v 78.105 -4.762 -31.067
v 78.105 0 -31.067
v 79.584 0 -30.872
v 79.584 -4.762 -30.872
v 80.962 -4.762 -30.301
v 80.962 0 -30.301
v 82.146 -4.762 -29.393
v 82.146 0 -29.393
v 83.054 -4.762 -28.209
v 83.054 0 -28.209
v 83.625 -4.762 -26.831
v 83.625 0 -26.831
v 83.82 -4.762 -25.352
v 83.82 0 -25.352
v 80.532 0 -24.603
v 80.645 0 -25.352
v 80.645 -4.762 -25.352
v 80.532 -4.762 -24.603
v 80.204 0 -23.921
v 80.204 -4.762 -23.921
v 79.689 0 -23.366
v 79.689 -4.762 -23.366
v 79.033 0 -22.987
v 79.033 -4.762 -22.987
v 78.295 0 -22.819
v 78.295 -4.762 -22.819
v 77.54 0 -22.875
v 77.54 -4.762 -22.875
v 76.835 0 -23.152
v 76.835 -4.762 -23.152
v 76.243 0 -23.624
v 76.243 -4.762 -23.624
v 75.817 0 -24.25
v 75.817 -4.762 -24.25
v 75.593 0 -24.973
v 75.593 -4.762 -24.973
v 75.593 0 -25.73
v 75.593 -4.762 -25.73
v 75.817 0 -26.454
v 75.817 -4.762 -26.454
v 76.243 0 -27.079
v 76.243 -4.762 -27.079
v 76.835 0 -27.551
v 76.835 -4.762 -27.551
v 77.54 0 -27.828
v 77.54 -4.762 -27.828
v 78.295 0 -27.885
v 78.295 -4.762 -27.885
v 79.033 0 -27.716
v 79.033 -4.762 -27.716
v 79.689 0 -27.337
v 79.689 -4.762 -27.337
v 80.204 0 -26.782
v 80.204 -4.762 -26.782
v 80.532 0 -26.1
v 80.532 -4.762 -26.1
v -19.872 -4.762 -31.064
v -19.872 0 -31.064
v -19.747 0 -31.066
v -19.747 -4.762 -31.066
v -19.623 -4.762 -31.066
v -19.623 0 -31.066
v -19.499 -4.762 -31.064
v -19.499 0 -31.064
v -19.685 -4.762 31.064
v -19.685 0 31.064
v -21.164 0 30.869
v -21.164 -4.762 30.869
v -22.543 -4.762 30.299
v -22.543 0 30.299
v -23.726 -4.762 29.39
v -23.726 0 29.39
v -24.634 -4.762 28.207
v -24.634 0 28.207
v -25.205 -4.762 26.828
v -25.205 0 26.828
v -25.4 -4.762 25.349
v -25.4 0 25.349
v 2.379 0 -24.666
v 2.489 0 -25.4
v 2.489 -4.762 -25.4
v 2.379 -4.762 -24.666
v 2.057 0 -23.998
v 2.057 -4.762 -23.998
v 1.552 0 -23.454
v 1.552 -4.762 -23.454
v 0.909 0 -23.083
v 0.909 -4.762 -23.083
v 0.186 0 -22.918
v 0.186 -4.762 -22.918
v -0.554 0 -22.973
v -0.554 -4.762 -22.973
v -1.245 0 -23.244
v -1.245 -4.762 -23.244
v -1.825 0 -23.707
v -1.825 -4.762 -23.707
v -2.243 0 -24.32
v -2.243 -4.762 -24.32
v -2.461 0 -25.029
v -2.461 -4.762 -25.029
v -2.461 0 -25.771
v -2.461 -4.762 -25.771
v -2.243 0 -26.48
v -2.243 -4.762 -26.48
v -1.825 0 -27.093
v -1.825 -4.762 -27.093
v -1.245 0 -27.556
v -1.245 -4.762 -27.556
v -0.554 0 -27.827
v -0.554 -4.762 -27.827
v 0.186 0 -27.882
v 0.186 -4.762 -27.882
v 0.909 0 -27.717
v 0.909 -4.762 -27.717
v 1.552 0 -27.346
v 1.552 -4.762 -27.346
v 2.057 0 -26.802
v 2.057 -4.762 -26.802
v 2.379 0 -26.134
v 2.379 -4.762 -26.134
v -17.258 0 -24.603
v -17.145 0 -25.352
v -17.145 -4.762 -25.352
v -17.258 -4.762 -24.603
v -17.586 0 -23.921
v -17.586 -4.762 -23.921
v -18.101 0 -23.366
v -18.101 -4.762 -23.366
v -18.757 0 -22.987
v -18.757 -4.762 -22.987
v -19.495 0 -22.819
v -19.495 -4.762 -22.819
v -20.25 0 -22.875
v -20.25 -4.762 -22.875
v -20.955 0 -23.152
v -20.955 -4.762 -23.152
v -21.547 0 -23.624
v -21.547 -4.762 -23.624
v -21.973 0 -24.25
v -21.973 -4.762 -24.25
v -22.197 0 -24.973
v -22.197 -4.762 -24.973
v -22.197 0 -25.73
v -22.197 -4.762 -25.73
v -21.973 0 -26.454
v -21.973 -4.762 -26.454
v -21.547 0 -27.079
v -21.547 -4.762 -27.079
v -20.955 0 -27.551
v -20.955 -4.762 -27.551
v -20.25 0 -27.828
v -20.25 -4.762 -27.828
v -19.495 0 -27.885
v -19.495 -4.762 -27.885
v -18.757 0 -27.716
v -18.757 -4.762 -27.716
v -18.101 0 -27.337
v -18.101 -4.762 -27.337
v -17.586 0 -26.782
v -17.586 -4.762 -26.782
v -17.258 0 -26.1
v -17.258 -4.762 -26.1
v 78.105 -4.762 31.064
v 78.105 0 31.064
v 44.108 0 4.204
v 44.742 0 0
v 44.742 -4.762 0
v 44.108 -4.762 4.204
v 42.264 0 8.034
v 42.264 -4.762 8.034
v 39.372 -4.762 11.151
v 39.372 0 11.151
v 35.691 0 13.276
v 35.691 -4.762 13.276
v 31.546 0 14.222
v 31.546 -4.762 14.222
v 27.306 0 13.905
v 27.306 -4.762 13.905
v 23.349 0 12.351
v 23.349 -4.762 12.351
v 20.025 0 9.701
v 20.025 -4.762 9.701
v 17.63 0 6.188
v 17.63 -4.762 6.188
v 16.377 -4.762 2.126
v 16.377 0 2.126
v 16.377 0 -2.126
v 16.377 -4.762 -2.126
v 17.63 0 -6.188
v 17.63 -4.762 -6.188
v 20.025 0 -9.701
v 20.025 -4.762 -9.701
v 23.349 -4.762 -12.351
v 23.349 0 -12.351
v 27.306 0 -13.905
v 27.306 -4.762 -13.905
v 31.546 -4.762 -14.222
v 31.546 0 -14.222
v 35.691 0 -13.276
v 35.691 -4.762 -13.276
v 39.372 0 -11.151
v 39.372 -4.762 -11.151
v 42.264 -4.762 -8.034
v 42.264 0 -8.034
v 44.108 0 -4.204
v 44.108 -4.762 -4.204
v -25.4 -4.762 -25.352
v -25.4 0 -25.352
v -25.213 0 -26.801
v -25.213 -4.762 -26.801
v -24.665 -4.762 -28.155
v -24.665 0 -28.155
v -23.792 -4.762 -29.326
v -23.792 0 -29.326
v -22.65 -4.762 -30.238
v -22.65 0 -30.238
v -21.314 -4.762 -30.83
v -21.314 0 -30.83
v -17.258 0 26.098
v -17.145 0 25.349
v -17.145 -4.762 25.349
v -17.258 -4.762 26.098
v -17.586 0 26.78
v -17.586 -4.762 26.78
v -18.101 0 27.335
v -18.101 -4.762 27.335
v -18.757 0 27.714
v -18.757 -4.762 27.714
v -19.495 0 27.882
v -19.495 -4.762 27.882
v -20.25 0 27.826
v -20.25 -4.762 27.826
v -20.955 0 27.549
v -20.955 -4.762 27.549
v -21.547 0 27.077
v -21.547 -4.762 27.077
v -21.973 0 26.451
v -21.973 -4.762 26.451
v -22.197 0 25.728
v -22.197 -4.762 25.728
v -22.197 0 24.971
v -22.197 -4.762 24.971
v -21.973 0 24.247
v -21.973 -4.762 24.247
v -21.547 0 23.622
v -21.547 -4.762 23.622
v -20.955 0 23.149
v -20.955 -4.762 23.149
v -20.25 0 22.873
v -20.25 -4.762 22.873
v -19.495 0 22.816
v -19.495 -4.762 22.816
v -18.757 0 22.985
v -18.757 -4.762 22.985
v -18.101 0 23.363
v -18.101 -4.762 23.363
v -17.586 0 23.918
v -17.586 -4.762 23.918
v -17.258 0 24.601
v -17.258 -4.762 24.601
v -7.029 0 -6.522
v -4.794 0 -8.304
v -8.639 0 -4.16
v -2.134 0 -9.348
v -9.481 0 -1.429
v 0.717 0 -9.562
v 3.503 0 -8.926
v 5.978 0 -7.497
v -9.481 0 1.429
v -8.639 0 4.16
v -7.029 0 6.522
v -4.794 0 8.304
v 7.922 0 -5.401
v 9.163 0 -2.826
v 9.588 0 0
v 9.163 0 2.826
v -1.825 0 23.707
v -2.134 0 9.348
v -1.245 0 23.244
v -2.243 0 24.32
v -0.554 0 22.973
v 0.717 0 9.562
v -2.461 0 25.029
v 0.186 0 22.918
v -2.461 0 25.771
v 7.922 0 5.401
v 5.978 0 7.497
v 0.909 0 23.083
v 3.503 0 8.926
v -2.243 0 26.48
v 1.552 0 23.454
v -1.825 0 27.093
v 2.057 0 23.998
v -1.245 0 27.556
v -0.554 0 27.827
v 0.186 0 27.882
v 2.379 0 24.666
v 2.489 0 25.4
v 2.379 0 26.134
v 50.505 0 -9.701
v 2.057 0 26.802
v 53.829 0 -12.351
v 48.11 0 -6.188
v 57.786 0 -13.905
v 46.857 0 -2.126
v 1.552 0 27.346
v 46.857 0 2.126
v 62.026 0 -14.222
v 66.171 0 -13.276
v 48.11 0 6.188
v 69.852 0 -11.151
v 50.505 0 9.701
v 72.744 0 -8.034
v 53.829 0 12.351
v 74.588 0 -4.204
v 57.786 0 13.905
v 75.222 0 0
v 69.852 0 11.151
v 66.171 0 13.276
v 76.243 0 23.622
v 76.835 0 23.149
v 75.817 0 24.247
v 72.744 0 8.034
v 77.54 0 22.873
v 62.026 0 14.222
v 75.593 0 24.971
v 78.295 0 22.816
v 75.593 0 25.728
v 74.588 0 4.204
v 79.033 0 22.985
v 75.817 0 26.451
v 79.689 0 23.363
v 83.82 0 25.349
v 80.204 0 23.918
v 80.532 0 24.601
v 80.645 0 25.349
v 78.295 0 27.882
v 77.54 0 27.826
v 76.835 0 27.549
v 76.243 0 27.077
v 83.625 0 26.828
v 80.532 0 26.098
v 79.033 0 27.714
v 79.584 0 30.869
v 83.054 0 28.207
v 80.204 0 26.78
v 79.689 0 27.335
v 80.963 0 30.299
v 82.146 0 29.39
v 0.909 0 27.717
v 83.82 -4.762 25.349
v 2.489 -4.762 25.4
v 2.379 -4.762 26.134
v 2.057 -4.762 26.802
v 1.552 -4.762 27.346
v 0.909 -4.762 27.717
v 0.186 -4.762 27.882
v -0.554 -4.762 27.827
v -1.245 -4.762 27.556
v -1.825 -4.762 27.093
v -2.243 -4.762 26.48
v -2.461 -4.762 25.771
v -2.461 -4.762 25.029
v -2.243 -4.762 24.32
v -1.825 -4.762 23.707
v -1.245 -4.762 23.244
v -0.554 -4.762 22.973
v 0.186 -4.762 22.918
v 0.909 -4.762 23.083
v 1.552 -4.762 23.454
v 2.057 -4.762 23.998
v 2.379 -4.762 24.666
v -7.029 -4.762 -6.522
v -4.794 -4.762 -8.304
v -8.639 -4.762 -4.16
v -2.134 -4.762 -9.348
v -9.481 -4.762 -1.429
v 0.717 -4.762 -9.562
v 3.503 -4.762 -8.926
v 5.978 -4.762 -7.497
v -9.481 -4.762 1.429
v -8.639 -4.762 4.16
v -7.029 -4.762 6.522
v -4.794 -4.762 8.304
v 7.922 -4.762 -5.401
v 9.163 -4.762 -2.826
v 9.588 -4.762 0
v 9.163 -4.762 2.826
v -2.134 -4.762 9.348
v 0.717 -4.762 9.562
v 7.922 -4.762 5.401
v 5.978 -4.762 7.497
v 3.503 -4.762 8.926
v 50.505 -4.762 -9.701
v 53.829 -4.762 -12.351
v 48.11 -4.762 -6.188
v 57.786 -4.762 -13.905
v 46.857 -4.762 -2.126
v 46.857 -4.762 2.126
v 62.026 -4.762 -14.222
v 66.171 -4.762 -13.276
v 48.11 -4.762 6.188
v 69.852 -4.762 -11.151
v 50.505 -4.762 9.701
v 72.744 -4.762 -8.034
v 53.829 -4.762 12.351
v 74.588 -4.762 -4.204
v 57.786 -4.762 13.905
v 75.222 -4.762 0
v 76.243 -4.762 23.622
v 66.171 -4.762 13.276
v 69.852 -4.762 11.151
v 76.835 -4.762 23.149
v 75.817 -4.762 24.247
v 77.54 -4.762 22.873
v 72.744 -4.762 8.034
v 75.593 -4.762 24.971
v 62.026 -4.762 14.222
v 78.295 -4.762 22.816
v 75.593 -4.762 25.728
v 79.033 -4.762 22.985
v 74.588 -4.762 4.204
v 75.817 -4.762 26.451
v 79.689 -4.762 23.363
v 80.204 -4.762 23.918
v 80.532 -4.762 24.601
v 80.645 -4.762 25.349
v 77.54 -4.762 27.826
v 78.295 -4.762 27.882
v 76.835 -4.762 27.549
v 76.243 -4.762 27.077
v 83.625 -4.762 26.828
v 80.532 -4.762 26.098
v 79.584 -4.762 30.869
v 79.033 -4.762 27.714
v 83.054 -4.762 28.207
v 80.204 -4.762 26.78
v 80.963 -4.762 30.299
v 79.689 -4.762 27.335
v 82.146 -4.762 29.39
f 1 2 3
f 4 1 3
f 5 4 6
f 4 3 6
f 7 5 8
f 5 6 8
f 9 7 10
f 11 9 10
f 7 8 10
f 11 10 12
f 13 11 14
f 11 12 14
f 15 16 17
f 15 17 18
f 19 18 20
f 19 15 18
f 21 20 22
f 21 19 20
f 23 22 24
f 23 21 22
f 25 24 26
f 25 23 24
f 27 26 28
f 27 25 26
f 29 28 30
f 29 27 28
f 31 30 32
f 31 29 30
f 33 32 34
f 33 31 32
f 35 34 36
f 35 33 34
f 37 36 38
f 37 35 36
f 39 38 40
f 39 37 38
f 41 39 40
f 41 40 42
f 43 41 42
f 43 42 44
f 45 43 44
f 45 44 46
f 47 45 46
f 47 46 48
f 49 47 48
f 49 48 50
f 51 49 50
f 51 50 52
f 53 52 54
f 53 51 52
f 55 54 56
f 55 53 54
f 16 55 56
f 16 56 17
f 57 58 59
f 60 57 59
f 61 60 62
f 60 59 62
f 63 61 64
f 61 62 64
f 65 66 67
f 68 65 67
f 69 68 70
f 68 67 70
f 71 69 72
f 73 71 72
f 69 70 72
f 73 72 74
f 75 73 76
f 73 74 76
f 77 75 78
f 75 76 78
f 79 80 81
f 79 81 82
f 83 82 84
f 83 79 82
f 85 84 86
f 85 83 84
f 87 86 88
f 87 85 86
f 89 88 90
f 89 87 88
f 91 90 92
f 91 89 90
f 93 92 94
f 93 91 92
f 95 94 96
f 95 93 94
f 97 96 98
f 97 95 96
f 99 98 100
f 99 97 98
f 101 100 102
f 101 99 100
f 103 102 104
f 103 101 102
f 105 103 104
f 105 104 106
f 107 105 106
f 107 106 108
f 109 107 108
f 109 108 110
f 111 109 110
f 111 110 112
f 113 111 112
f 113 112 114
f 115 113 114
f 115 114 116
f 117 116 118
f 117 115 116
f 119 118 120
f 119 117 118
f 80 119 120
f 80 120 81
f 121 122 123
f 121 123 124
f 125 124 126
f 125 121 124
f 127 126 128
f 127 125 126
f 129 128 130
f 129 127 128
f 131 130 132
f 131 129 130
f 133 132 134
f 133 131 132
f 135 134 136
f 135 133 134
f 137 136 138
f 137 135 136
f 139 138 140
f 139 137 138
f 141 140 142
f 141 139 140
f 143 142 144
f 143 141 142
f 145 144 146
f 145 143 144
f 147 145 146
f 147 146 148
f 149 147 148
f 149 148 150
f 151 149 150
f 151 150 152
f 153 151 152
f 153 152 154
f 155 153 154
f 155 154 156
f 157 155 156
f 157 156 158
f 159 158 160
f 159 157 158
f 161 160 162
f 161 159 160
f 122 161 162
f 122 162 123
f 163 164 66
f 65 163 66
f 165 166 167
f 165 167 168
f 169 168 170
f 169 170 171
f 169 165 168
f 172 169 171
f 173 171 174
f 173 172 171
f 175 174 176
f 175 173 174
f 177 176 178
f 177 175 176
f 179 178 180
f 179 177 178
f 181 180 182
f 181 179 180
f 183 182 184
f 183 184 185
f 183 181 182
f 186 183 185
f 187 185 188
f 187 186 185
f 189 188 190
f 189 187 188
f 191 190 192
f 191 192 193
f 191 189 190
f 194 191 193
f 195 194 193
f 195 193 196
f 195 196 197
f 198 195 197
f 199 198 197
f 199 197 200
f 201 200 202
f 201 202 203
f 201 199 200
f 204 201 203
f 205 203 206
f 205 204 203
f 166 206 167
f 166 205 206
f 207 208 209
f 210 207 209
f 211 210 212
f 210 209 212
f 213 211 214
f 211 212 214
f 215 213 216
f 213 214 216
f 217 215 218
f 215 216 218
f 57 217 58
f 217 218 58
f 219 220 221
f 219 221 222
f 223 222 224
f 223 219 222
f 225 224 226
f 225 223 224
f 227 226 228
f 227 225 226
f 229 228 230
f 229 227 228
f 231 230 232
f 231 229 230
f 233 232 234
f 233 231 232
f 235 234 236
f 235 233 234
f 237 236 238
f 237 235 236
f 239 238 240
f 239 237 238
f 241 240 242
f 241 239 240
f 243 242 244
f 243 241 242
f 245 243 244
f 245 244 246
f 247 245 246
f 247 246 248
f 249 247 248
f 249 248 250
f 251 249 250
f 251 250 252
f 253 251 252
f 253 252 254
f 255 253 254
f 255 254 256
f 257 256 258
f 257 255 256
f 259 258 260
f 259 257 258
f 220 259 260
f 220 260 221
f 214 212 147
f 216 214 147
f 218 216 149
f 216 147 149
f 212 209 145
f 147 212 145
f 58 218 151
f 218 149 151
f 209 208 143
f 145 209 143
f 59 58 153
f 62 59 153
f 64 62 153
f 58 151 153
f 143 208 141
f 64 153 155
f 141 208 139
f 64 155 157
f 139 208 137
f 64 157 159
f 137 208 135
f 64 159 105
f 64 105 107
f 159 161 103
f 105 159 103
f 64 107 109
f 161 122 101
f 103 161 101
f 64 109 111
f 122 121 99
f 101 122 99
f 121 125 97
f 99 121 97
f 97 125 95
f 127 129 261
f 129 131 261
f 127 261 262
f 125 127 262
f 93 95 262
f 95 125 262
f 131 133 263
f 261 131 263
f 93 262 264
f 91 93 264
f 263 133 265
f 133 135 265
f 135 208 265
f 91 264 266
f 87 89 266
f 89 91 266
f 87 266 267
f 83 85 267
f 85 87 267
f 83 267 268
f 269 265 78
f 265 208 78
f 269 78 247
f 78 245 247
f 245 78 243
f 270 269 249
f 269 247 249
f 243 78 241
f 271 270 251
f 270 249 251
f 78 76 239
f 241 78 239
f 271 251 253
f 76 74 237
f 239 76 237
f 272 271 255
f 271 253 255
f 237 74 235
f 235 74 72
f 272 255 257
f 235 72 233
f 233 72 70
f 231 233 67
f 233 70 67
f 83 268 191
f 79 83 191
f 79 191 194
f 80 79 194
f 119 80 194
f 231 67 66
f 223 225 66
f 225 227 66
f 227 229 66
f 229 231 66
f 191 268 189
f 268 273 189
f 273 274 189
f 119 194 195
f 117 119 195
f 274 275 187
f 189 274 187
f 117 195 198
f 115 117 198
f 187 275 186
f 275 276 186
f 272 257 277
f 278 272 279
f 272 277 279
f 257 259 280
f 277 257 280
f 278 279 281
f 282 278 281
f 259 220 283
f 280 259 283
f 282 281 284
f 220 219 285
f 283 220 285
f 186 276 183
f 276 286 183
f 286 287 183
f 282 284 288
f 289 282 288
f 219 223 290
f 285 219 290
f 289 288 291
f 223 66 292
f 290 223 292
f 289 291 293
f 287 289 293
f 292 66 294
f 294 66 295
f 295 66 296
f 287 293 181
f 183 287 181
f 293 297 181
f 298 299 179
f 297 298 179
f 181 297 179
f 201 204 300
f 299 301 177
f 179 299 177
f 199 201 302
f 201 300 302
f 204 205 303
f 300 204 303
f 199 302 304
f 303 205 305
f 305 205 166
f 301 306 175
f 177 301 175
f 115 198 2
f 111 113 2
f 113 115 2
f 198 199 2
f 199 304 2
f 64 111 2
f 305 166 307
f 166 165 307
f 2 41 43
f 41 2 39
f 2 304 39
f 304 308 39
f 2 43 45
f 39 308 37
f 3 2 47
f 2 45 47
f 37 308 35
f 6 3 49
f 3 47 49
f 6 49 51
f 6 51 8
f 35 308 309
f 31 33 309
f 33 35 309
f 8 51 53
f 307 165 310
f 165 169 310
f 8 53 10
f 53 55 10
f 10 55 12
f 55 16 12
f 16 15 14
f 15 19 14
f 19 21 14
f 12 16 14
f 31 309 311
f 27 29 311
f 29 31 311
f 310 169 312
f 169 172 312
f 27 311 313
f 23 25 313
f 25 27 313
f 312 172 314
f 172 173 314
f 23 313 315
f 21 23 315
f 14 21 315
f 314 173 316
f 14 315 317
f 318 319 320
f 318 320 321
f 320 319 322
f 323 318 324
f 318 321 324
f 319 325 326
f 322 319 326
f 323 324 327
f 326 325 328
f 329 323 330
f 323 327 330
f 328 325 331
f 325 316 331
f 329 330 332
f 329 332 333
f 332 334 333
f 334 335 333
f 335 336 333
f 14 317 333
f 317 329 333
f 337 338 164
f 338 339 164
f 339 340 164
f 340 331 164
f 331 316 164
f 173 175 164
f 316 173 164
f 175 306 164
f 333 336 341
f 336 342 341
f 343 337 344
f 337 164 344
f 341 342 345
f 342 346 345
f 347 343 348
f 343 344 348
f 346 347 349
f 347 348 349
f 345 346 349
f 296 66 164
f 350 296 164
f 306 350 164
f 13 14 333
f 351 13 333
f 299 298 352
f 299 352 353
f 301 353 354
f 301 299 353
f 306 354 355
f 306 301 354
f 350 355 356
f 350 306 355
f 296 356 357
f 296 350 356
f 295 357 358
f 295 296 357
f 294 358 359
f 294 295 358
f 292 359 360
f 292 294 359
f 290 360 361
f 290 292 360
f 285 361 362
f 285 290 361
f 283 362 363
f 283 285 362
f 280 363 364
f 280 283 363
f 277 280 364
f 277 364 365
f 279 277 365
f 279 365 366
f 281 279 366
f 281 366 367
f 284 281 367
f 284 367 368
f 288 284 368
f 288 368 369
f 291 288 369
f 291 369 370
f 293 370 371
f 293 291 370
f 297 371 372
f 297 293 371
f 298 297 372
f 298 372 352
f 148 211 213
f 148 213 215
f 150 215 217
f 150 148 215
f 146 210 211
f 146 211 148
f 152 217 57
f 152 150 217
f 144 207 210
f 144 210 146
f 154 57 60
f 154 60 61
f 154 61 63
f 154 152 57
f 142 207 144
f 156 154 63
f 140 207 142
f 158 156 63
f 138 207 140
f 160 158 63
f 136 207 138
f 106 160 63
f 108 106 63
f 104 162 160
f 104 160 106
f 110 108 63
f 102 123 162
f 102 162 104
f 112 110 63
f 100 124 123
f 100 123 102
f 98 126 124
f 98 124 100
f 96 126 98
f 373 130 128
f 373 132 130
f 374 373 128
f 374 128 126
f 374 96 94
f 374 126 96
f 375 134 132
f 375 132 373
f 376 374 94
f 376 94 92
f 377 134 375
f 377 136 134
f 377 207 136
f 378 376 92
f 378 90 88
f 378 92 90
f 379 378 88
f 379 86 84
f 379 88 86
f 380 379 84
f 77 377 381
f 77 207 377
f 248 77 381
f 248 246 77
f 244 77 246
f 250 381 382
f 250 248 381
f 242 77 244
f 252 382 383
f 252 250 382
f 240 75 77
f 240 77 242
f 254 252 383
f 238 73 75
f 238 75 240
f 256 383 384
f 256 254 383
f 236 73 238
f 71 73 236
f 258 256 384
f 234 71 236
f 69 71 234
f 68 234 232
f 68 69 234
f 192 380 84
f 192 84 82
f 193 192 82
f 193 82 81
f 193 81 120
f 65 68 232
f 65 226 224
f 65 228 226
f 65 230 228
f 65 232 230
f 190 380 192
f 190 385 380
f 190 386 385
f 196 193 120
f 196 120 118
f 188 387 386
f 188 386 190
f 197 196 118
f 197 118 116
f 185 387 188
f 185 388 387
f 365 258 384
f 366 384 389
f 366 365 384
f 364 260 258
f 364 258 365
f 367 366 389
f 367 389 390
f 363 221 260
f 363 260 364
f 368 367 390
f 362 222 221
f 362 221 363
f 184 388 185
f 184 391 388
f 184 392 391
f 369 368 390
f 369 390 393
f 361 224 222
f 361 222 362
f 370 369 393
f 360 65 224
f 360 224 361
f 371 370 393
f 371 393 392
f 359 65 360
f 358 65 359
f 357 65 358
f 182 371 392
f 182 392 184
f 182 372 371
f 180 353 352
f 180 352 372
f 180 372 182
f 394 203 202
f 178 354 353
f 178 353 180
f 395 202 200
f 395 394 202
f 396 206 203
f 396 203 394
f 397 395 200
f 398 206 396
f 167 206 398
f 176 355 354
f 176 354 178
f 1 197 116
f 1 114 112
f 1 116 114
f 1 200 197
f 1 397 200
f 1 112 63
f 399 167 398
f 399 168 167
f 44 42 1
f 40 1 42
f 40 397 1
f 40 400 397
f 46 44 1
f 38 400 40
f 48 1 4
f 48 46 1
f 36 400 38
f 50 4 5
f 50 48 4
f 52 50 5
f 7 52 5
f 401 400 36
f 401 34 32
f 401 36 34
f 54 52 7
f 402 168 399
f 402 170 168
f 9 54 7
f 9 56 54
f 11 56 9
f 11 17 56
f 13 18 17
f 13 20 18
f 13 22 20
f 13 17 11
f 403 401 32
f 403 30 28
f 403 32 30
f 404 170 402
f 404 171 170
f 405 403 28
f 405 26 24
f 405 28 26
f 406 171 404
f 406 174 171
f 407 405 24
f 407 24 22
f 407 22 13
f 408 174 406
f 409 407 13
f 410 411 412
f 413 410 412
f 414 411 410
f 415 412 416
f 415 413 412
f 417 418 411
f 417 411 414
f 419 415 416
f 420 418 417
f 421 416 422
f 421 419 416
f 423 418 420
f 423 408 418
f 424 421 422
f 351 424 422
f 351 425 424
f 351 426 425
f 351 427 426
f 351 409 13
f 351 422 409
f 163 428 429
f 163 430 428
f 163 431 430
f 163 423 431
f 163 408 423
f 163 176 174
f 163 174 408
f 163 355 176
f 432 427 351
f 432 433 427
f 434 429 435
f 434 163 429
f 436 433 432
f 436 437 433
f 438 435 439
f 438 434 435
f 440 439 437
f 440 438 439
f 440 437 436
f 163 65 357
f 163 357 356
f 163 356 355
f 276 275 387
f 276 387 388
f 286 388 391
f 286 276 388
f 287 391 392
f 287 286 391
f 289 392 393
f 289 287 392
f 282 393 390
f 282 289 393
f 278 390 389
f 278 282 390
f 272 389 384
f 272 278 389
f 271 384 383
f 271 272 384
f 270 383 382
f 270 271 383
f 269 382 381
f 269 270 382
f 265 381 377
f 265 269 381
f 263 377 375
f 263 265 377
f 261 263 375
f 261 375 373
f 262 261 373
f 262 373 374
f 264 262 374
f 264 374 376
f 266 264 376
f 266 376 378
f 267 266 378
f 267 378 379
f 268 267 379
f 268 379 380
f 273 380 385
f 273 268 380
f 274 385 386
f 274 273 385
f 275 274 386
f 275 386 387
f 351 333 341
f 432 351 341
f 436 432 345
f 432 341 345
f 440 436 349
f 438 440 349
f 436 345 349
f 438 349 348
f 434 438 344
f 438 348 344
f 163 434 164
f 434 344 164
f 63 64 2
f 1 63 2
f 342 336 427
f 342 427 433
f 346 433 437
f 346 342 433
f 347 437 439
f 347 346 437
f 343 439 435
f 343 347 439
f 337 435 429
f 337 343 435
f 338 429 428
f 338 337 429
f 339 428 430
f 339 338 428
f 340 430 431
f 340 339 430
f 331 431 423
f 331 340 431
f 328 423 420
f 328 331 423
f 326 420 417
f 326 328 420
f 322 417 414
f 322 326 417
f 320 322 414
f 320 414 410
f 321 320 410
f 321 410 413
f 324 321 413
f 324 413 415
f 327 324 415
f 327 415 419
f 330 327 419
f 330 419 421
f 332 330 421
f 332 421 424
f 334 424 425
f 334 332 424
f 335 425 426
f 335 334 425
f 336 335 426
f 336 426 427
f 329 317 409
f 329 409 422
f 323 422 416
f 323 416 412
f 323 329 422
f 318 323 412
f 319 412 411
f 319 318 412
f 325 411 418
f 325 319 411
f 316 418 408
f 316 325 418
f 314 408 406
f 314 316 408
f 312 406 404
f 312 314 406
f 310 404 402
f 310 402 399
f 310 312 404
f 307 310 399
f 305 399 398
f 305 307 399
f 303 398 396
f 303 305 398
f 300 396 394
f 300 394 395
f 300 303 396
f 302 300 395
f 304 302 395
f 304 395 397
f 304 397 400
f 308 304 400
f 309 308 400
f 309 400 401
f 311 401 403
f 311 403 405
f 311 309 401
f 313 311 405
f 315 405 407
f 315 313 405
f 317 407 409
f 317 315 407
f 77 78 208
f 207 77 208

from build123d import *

# Parameters (mm, degrees)
F0_R     = 2.54
F0_R_2   = 2.4892
F0_R_3   = 9.5885
F0_R_4   = 14.2621
F1_DEPTH = 4.7625


# Not quite as in the source:
# - a length typed as a fraction of an inch, garbled in the dataset ("3 / 203.2 mm" for 3/8 in), is restored


with BuildPart() as f1:
    # F0 (on Front) → F1 (new body)
    with BuildSketch(Plane.XZ):
        with BuildLine():
            Line((83.82, -25.3516301214), (83.82, 25.3492))
            ThreePointArc((83.82, 25.3492), (82.1461152545, 29.3903152545), (78.105, 31.0642))
            Line((78.105, 31.0642), (-19.685, 31.0642))
            ThreePointArc((-19.685, 31.0642), (-23.7261152545, 29.3903152545), (-25.4, 25.3492))
            Line((-25.4, 25.3492), (-25.4, -25.3516301214))
            ThreePointArc((-25.4, -25.3516301214), (-23.7915717475, -29.3262110405), (-19.8716383264, -31.0635817261))
            Line((-19.8716383264, -31.0635817261), (-19.4987171118, -31.063593329))
            Line((-19.4987171118, -31.063593329), (78.1048221862, -31.0666301186))
            ThreePointArc((78.1048221862, -31.0666301186), (82.1460523873, -29.392808242), (83.82, -25.3516301214))
        make_face()
        with Locations((-19.685, -25.3516301214)):
            Circle(F0_R, mode=Mode.SUBTRACT)
        with Locations((0, -25.4)):
            Circle(F0_R_2, mode=Mode.SUBTRACT)
        with Locations((78.105, -25.3516301214)):
            Circle(F0_R, mode=Mode.SUBTRACT)
        Circle(F0_R_3, mode=Mode.SUBTRACT)
        with Locations((-19.685, 25.3492)):
            Circle(F0_R, mode=Mode.SUBTRACT)
        with Locations((0, 25.4)):
            Circle(F0_R_2, mode=Mode.SUBTRACT)
        with Locations((30.48, 0)):
            Circle(F0_R_4, mode=Mode.SUBTRACT)
        with Locations((60.96, 0)):
            Circle(F0_R_4, mode=Mode.SUBTRACT)
        with Locations((78.105, 25.3492)):
            Circle(F0_R, mode=Mode.SUBTRACT)
        with BuildLine():
            ThreePointArc((-19.8716383264, -31.0635817261), (-19.6851778138, -31.0666301186), (-19.4987171118, -31.063593329))
            Line((-19.4987171118, -31.063593329), (-19.8716383264, -31.0635817261))
        make_face()
    extrude(amount=F1_DEPTH)


solid = f1.part
